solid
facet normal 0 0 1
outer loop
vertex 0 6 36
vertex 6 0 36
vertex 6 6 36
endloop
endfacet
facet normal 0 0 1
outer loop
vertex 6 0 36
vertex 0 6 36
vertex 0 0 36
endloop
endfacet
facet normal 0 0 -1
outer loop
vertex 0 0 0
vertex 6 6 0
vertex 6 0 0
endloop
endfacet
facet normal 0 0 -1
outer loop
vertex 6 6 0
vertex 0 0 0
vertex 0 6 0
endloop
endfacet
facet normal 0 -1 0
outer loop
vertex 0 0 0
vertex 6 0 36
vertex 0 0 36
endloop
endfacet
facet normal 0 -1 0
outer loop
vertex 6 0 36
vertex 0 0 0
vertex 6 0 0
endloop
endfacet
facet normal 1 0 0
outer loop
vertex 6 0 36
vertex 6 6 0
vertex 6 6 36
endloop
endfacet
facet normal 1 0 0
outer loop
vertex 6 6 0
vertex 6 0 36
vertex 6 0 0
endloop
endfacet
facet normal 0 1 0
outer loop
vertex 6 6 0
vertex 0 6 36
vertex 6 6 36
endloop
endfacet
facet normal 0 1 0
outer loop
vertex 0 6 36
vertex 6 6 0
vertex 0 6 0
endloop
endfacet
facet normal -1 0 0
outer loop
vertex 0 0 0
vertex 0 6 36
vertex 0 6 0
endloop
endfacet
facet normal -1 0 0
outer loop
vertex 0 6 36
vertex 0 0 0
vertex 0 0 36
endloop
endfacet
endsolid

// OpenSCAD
// Feather Key dimensions
key_width = 6;    // Width of the key in mm
key_height = 6;   // Height of the key in mm
key_length = 36;  // Length of the key in mm

/**
 * Renders a standard feather key.
 * @param width The width of the key.
 * @param height The height of the key.
 * @param length The length of the key.
 */
module feather_key(width, height, length) {
    cube([width, height, length]);
}

// Instantiate the feather key with the defined dimensions
feather_key(key_width, key_height, key_length);
